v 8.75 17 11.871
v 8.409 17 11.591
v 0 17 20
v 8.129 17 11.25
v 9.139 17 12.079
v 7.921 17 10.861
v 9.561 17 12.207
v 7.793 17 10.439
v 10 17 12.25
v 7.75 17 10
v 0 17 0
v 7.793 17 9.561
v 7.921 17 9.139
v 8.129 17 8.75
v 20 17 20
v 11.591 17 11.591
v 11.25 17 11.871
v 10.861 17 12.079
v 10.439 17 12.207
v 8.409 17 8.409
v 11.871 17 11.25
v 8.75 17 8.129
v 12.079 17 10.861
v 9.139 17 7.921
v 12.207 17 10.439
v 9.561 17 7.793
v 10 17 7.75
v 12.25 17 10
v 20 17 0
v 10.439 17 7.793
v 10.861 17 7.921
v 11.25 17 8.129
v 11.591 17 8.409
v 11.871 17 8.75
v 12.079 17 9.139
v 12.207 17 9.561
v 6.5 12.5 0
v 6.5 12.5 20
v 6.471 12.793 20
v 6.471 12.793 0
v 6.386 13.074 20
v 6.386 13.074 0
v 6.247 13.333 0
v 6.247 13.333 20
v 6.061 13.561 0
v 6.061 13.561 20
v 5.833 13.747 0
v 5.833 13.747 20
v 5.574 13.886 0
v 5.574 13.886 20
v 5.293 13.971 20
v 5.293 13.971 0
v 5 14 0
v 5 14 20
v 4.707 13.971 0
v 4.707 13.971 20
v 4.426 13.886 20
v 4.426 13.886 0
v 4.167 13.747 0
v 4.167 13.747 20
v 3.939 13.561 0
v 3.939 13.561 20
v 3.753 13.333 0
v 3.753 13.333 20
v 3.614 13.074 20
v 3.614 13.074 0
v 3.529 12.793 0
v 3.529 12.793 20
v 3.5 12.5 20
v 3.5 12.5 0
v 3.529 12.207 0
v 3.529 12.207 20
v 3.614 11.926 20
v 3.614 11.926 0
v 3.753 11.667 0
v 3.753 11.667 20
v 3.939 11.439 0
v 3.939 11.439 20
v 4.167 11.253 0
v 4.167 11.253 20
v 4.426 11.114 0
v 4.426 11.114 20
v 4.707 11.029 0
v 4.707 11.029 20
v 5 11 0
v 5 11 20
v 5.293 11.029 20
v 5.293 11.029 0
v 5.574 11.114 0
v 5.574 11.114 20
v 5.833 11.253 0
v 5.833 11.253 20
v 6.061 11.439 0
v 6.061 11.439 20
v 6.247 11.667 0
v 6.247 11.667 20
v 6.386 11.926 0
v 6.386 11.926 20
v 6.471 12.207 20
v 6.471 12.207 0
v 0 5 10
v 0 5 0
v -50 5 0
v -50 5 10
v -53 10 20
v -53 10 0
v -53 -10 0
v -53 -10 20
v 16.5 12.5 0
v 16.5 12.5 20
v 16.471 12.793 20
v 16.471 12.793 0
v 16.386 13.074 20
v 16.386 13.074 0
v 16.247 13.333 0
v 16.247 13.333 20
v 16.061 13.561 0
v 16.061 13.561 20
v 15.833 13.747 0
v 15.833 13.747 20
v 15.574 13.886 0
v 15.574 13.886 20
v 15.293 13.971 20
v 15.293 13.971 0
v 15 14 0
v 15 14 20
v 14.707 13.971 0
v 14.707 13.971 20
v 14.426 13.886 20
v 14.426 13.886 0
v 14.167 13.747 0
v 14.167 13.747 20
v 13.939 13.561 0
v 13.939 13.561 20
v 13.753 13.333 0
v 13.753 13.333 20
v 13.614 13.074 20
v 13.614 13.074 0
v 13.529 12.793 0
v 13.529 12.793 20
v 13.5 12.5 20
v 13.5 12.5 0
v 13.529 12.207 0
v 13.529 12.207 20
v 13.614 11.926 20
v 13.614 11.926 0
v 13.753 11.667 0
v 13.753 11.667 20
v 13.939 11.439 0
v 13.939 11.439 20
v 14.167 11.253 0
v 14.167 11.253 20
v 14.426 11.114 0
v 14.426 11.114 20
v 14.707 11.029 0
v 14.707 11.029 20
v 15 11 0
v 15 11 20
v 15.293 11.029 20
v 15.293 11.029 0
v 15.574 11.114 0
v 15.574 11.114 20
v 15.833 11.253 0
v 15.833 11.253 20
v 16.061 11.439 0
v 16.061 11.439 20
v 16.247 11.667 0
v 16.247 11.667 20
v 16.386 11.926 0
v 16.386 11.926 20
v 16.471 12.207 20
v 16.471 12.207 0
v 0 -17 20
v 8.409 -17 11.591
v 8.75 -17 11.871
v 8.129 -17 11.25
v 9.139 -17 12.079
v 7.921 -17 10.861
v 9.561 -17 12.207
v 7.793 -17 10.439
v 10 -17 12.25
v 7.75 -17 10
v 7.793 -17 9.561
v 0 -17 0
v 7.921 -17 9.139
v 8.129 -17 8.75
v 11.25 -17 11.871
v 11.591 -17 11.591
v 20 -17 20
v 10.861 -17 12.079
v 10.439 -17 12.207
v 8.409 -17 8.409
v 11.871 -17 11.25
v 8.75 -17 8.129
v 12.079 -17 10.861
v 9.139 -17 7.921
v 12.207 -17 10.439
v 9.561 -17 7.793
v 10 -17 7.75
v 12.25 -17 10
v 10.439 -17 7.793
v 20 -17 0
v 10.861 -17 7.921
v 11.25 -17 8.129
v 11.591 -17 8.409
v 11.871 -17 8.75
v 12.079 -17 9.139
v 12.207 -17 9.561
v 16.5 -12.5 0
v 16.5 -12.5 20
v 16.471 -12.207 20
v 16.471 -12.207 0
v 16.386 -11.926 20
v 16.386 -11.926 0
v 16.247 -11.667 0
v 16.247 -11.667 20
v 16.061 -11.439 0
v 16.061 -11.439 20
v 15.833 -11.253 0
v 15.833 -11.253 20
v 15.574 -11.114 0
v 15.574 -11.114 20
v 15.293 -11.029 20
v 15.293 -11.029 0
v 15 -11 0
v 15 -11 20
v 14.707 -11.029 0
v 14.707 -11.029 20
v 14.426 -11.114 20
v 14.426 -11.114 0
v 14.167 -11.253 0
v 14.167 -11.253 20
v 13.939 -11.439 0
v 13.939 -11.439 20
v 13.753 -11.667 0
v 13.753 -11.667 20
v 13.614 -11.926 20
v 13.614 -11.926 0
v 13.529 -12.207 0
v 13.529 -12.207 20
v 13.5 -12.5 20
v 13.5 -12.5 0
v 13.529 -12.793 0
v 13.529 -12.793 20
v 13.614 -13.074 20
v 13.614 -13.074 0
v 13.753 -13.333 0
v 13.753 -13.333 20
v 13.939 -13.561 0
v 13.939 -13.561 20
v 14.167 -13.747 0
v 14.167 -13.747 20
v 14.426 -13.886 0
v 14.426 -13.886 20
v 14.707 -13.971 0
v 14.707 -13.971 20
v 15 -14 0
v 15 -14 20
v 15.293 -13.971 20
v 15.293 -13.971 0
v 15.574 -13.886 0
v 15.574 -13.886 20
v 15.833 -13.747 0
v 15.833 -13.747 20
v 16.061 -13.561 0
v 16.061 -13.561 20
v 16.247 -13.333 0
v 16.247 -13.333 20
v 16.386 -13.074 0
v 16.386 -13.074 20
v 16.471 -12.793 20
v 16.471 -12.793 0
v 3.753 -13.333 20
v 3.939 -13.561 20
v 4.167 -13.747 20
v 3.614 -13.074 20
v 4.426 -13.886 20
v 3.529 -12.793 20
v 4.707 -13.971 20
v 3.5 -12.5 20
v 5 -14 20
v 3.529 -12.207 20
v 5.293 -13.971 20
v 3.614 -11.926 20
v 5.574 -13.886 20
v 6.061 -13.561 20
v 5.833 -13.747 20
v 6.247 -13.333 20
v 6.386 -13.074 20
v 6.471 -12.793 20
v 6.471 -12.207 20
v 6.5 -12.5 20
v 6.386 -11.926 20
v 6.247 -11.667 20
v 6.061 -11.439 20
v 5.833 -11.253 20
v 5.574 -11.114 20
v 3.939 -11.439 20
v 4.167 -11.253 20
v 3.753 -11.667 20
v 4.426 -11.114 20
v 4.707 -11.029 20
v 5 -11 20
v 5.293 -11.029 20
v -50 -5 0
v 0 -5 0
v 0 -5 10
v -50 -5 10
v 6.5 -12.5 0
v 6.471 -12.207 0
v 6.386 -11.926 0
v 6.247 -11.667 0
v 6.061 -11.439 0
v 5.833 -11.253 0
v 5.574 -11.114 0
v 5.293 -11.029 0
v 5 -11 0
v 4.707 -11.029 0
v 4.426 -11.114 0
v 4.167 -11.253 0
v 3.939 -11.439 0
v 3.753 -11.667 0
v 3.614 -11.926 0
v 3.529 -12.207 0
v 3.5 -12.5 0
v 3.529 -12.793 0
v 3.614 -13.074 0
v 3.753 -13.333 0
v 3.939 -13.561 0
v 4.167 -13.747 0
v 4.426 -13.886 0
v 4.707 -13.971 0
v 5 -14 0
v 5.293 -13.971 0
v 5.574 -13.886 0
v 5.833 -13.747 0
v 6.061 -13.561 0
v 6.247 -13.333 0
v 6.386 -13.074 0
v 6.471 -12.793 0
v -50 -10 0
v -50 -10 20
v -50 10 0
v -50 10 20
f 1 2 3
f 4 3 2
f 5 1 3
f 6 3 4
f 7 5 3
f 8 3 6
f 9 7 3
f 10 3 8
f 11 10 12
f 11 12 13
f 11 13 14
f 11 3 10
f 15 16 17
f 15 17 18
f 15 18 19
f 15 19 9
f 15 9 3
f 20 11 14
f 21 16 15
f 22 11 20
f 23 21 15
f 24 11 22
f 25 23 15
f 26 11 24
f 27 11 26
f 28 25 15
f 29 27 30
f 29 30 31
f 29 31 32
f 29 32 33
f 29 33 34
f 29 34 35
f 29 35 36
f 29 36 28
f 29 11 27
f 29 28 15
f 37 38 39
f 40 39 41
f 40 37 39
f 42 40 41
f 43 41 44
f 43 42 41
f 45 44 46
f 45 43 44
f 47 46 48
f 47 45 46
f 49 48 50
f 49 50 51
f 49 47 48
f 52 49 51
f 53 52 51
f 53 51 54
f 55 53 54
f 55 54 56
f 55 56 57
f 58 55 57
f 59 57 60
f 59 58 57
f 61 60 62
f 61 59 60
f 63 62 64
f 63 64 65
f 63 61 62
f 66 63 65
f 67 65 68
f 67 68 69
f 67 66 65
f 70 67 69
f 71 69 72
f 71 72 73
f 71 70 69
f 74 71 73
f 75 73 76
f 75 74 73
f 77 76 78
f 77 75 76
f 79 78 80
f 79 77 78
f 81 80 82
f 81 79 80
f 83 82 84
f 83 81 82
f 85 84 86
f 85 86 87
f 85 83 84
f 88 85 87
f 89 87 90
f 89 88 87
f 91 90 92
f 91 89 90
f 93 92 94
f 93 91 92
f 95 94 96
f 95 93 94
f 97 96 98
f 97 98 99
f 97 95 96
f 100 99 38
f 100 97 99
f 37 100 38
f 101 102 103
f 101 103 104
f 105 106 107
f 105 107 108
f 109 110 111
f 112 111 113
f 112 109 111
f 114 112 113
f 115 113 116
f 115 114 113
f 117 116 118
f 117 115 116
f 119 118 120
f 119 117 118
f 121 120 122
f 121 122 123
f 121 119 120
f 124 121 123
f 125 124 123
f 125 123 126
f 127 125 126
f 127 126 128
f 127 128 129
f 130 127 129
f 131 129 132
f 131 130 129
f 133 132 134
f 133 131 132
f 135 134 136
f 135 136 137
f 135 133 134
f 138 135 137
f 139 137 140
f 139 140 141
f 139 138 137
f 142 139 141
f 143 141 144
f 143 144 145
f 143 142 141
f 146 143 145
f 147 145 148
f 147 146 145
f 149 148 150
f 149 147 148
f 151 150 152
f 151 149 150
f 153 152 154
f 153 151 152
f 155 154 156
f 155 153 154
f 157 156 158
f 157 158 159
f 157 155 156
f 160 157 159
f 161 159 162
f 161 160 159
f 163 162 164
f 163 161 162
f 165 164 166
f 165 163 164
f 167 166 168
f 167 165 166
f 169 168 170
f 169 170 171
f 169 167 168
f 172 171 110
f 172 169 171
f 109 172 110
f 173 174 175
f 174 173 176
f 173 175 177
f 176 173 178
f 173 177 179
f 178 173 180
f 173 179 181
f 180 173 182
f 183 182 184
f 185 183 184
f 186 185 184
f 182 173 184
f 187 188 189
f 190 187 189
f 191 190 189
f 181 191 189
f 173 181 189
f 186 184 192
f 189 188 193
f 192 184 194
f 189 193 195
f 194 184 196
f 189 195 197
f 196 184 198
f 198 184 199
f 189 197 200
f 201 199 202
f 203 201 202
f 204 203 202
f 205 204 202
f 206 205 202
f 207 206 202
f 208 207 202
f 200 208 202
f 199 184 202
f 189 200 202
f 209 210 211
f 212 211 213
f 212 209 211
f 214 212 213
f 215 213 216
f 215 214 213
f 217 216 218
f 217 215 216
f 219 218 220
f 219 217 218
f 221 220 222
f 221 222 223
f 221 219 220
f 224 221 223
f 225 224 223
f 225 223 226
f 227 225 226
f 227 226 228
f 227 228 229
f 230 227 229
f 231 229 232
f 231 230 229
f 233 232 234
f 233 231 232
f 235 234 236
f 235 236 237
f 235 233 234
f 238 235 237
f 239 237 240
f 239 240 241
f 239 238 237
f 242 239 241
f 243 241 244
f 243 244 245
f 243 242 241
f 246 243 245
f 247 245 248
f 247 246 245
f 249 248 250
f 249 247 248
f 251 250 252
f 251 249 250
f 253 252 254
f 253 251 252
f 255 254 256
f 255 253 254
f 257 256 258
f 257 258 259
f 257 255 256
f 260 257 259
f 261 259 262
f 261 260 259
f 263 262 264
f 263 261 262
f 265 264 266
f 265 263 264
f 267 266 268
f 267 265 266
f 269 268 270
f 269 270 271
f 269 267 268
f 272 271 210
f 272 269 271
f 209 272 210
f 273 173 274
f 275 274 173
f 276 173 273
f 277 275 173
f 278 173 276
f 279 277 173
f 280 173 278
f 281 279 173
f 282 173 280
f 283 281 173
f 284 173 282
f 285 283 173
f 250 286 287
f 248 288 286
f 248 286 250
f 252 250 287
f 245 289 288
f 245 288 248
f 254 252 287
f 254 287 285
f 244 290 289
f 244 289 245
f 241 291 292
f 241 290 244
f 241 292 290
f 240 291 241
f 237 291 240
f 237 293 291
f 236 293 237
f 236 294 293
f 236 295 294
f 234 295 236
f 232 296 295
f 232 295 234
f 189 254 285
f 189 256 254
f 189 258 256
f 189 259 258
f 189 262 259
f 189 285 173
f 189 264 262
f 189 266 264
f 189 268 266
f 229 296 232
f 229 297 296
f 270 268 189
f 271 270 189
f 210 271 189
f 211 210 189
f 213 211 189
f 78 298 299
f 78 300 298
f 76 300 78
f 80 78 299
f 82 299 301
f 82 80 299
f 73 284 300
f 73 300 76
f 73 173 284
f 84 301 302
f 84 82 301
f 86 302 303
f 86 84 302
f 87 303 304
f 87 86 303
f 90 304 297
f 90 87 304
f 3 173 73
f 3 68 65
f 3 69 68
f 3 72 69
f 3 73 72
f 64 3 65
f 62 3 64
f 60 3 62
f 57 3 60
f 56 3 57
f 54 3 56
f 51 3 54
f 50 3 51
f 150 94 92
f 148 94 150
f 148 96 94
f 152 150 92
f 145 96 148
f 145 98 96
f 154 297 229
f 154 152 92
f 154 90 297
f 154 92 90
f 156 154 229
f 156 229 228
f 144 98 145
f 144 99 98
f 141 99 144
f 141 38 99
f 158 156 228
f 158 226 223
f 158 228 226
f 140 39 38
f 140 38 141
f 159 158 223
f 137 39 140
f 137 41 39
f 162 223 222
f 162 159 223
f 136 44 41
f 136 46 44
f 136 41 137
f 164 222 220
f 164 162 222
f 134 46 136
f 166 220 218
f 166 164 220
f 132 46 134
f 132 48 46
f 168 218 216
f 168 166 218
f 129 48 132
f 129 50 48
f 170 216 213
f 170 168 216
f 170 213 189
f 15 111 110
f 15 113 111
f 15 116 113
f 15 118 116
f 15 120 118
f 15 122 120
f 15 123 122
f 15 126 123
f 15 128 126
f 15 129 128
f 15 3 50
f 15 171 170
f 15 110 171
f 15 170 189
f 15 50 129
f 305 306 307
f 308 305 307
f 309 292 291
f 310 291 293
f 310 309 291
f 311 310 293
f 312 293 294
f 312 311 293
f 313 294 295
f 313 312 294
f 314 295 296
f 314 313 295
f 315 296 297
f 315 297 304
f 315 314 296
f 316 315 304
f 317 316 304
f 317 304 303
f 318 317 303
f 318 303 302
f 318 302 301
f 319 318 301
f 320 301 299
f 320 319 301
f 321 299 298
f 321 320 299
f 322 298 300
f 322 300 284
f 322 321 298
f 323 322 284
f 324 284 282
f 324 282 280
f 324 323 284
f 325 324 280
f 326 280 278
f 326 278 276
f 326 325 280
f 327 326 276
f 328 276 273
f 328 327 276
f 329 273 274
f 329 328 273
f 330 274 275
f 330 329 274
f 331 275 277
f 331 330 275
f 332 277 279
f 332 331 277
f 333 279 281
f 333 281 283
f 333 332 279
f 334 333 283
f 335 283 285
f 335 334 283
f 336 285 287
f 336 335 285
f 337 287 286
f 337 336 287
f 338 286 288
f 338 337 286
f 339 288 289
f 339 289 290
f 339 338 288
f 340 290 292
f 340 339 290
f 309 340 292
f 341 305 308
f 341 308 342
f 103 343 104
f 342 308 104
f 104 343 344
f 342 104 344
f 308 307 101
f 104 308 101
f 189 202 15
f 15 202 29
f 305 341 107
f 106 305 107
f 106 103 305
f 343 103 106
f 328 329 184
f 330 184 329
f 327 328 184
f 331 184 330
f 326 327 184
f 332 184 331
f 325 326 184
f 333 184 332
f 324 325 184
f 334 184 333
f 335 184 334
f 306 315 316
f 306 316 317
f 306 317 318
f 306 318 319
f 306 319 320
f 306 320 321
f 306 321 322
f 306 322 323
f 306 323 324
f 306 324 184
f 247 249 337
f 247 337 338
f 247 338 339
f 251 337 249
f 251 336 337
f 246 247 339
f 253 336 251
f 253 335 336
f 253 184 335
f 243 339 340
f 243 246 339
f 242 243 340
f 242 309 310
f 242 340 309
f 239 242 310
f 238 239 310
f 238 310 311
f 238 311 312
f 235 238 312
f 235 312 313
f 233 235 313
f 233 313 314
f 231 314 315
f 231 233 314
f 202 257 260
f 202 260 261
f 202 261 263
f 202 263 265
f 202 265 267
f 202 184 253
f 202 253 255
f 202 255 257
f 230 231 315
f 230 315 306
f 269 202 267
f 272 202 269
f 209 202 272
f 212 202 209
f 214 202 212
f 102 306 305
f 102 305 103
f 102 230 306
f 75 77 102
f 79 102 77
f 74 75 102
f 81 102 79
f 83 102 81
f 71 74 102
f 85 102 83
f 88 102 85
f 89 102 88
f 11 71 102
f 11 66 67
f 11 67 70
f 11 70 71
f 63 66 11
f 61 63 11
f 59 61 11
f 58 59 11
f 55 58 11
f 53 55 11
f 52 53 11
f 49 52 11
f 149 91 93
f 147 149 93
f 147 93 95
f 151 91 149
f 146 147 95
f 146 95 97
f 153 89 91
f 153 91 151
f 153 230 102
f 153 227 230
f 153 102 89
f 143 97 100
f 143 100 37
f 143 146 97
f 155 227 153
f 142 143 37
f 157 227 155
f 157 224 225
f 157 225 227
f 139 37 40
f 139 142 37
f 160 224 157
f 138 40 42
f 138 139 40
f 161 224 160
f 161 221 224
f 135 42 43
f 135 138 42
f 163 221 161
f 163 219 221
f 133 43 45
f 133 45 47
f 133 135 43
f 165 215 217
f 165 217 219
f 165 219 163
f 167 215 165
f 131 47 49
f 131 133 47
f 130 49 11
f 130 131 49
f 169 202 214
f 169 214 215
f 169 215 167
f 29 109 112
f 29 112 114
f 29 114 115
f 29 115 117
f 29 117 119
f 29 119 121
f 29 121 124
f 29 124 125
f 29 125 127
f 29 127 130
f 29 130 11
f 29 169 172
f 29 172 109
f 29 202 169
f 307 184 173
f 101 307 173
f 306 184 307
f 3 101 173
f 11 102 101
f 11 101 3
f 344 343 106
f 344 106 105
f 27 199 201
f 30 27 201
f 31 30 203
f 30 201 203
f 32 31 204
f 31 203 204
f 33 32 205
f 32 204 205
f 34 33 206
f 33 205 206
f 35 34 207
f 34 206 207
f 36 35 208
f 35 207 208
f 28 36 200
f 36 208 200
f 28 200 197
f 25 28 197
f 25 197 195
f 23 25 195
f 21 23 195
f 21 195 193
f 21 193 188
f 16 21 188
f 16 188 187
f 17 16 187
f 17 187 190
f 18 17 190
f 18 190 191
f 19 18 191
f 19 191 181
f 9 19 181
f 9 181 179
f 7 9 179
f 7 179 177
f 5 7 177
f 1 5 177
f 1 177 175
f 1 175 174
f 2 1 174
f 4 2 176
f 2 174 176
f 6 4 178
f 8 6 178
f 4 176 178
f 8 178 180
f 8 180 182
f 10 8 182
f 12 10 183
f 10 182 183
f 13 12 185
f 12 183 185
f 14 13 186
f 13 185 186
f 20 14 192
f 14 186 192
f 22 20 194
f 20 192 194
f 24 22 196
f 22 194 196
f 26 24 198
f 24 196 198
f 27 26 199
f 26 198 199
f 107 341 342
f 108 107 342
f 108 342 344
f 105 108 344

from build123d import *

# Parameters (mm, degrees)
MAIN_W                  = 20
MAIN_H                  = 34
MAIN_R                  = 1.5
MAIN_EXTRUSION_DEPTH    = 20
ESQUISSE2_R             = 2.25
ENL_V_MAT_EXTRU_1_DEPTH = 45.226688775
ESQUISSE3_W             = 10
ESQUISSE3_H             = 10
BOSS_EXTRU_3_DEPTH      = 50
ESQUISSE4_W             = 20
ESQUISSE4_H             = 20
BOSS_EXTRU_4_DEPTH      = 3


with BuildPart() as part:
    # Main → Main Extrusion (new body)
    with BuildSketch(Plane.XY):
        with Locations((10, 0)):
            Rectangle(MAIN_W, MAIN_H)
        with Locations((5, 12.5)):
            Circle(MAIN_R, mode=Mode.SUBTRACT)
        with Locations((15, 12.5)):
            Circle(MAIN_R, mode=Mode.SUBTRACT)
        with Locations((5, -12.5)):
            Circle(MAIN_R, mode=Mode.SUBTRACT)
        with Locations((15, -12.5)):
            Circle(MAIN_R, mode=Mode.SUBTRACT)
    extrude(amount=MAIN_EXTRUSION_DEPTH)

    # Esquisse2 → Enlèv. mat.-Extru.1 (cut, through all)
    with BuildSketch(Plane.XZ.offset(17)):
        with Locations(Location((10, 10, 0), (0, 0, 270))):
            Circle(ESQUISSE2_R)
    extrude(amount=-ENL_V_MAT_EXTRU_1_DEPTH, mode=Mode.SUBTRACT)

    # Esquisse3 → Boss.-Extru.3 (add)
    with BuildSketch(Plane.ZY):
        with Locations((5, 0)):
            Rectangle(ESQUISSE3_W, ESQUISSE3_H)
    extrude(amount=BOSS_EXTRU_3_DEPTH)

    # Esquisse4 → Boss.-Extru.4 (add)
    with BuildSketch(Plane.ZY.offset(50)):
        with Locations((10, 0)):
            Rectangle(ESQUISSE4_W, ESQUISSE4_H)
    extrude(amount=BOSS_EXTRU_4_DEPTH)


solid = part.part
